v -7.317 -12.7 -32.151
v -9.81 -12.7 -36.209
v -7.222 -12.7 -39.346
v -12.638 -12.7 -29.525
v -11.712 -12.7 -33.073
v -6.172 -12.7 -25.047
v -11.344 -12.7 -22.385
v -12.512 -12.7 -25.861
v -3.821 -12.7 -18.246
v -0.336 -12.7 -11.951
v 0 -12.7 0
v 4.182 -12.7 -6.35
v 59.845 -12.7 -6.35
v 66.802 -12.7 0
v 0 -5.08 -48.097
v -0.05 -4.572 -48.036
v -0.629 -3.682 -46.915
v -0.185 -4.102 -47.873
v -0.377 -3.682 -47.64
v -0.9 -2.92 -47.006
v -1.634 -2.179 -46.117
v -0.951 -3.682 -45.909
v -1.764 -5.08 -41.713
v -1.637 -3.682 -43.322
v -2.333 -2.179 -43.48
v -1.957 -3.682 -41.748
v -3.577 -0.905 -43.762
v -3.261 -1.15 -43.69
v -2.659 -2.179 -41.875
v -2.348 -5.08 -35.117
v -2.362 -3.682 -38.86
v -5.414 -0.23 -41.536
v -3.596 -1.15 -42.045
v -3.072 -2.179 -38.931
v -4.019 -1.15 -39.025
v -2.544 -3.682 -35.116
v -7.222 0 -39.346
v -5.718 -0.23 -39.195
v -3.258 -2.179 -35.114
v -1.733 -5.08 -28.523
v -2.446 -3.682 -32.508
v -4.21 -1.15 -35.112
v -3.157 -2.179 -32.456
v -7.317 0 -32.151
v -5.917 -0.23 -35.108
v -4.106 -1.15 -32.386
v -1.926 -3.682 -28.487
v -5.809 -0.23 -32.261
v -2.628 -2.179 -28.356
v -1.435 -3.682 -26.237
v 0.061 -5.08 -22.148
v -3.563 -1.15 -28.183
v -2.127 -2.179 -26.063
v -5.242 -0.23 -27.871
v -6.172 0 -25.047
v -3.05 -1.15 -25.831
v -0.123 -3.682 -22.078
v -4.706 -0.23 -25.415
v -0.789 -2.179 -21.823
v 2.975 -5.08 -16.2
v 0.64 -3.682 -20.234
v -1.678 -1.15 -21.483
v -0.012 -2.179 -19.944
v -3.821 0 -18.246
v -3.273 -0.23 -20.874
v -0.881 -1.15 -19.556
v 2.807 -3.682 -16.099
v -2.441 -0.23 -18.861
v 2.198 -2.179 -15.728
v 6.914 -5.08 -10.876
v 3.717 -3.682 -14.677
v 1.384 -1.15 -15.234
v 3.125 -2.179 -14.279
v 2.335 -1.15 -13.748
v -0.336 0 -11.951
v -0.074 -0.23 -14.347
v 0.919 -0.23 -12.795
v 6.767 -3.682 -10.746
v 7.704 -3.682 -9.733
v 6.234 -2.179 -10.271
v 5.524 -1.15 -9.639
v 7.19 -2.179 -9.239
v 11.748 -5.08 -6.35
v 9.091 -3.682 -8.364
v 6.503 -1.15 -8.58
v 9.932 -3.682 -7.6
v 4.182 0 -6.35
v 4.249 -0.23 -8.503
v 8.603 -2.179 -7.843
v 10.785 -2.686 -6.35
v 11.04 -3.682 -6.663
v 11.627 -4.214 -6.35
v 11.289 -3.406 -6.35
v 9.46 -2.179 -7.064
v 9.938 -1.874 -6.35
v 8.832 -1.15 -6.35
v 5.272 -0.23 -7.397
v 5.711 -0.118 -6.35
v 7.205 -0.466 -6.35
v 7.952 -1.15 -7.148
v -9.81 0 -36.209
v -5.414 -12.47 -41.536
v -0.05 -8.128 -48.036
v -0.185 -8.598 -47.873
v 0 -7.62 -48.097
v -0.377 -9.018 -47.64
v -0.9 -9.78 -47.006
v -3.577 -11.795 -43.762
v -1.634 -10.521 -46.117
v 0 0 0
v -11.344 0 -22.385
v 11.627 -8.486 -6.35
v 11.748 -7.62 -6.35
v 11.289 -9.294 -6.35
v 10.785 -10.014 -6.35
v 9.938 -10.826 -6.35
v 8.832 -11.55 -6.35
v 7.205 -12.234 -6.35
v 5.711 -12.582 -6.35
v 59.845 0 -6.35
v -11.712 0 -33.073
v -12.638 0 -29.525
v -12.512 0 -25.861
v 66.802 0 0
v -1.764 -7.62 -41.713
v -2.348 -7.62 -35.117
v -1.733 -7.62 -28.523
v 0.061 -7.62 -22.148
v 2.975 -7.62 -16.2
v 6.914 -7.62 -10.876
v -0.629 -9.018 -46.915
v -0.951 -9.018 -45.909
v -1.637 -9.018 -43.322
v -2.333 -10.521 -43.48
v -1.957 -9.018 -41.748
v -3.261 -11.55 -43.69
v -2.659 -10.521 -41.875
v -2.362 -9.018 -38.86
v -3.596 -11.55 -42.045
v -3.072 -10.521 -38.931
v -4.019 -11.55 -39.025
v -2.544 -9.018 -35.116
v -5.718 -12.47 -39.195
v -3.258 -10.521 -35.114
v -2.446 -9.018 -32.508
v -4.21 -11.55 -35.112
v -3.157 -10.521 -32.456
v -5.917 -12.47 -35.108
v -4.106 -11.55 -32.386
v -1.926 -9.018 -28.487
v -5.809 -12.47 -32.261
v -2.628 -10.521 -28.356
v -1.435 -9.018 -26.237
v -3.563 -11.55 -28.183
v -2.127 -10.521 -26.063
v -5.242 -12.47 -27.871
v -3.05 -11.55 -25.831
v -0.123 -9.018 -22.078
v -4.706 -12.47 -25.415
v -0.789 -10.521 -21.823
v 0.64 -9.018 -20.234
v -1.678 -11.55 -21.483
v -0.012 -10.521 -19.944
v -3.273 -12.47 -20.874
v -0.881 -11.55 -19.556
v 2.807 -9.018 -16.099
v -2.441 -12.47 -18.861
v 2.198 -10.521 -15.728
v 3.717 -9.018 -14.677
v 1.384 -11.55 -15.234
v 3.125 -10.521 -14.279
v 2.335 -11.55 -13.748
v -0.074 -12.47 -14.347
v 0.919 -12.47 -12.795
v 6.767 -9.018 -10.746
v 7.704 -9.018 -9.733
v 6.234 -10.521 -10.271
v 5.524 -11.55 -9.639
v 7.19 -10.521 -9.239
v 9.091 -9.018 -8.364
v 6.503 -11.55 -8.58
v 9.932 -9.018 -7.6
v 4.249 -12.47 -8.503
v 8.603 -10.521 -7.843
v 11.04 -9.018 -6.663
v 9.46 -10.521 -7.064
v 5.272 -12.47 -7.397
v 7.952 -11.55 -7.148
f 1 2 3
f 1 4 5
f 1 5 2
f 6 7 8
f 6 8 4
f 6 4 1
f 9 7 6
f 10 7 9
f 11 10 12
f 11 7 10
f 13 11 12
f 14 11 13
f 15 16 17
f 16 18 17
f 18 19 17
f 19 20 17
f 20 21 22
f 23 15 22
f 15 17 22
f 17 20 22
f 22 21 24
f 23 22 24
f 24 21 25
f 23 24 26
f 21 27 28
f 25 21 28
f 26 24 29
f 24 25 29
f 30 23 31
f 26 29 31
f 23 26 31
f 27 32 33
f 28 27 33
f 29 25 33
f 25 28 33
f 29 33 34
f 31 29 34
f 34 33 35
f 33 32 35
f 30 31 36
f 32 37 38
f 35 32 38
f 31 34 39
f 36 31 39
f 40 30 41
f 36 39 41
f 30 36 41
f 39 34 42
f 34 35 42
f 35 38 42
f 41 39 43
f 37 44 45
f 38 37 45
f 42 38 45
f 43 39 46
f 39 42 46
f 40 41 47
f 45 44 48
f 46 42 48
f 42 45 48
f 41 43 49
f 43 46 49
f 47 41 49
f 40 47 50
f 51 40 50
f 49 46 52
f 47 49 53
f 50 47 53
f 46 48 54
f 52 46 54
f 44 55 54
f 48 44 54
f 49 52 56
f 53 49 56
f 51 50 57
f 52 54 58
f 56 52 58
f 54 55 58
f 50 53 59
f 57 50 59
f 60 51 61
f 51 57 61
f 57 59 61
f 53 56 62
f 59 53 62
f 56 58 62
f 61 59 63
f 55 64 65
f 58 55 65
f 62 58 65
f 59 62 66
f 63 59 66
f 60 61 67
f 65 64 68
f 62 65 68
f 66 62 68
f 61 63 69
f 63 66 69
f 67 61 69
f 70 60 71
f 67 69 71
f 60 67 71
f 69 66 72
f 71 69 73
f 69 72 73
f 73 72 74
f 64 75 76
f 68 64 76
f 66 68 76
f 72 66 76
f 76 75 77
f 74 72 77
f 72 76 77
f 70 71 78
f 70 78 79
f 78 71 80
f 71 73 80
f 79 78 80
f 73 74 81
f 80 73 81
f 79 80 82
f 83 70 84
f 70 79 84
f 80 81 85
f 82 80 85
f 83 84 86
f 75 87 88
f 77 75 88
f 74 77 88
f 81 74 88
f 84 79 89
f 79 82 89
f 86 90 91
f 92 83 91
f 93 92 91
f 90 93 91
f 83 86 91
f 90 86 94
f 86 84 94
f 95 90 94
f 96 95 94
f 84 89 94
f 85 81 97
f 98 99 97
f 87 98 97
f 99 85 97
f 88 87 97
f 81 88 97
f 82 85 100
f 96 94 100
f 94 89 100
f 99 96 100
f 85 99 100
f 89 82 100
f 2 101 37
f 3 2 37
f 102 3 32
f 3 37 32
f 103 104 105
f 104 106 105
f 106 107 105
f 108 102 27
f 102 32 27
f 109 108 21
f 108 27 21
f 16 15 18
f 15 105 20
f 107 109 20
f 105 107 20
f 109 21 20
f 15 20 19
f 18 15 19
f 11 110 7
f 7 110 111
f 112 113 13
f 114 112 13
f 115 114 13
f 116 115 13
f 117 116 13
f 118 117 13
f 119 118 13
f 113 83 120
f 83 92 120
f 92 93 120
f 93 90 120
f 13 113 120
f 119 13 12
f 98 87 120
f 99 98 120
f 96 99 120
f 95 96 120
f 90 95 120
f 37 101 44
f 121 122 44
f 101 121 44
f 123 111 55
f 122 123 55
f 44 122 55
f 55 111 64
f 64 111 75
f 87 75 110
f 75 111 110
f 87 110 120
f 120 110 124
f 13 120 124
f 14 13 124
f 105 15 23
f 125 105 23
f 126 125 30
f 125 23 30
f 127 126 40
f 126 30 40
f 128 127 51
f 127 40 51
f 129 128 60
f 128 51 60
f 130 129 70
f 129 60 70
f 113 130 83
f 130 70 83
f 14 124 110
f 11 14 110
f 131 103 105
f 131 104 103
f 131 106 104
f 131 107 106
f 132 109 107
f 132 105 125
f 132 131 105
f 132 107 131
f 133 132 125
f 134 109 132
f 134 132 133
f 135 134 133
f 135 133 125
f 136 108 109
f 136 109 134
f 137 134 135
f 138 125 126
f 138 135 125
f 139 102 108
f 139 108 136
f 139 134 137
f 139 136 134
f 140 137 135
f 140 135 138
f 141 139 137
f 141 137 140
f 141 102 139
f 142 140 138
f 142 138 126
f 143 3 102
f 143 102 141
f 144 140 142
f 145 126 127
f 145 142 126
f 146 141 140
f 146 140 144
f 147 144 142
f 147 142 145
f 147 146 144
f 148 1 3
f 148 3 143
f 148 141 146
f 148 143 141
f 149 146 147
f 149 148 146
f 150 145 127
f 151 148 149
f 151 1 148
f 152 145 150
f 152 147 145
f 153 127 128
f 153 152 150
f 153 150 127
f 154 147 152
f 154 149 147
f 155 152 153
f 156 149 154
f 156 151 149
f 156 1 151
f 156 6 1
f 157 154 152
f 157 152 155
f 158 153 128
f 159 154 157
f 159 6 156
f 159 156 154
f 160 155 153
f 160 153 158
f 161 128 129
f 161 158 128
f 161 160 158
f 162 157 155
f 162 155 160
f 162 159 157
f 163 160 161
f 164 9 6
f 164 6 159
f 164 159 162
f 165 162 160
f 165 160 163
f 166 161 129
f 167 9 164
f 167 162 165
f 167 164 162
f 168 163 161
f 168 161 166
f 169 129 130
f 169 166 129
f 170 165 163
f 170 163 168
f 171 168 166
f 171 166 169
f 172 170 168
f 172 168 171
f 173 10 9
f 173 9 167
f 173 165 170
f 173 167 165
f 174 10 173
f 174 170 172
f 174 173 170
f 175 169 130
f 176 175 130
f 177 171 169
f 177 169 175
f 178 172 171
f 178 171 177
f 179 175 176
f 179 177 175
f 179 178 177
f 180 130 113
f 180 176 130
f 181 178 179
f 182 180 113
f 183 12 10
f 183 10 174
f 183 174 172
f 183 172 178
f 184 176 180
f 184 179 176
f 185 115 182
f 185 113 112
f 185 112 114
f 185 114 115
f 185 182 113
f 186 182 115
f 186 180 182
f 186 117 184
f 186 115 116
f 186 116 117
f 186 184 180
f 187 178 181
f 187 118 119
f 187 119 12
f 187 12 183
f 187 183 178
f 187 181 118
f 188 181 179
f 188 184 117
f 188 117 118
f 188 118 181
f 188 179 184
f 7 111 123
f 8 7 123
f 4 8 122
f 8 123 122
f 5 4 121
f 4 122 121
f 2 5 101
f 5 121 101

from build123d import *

# Parameters (mm, degrees)
F1_DEPTH = 12.7
F2_R     = 5.08


with BuildPart() as f1:
    # F0 (on Front) → F1 (new body)
    with BuildSketch(Plane.XZ):
        with BuildLine():
            Line((66.802, 0), (0, 0))
            Line((0, 0), (-11.343573, -22.384649))
            ThreePointArc((-11.343573, -22.384649), (-12.637739, -29.525329), (-9.810389, -36.20891))
            Line((-9.810389, -36.20891), (0, -48.09675))
            ThreePointArc((0, -48.09675), (-0.98103, -25.294337), (11.747858, -6.35))
            Line((11.747858, -6.35), (59.844611, -6.35))
            Line((59.844611, -6.35), (66.802, 0))
        make_face()
    extrude(amount=F1_DEPTH)

    # F2
    f2_edges = [f1.edges().sort_by_distance(p)[0] for p in [
        (-0.98103, -12.7, -25.294337),
        (-0.98103, 0, -25.294337),
    ]]
    fillet(f2_edges, radius=F2_R)


solid = f1.part
